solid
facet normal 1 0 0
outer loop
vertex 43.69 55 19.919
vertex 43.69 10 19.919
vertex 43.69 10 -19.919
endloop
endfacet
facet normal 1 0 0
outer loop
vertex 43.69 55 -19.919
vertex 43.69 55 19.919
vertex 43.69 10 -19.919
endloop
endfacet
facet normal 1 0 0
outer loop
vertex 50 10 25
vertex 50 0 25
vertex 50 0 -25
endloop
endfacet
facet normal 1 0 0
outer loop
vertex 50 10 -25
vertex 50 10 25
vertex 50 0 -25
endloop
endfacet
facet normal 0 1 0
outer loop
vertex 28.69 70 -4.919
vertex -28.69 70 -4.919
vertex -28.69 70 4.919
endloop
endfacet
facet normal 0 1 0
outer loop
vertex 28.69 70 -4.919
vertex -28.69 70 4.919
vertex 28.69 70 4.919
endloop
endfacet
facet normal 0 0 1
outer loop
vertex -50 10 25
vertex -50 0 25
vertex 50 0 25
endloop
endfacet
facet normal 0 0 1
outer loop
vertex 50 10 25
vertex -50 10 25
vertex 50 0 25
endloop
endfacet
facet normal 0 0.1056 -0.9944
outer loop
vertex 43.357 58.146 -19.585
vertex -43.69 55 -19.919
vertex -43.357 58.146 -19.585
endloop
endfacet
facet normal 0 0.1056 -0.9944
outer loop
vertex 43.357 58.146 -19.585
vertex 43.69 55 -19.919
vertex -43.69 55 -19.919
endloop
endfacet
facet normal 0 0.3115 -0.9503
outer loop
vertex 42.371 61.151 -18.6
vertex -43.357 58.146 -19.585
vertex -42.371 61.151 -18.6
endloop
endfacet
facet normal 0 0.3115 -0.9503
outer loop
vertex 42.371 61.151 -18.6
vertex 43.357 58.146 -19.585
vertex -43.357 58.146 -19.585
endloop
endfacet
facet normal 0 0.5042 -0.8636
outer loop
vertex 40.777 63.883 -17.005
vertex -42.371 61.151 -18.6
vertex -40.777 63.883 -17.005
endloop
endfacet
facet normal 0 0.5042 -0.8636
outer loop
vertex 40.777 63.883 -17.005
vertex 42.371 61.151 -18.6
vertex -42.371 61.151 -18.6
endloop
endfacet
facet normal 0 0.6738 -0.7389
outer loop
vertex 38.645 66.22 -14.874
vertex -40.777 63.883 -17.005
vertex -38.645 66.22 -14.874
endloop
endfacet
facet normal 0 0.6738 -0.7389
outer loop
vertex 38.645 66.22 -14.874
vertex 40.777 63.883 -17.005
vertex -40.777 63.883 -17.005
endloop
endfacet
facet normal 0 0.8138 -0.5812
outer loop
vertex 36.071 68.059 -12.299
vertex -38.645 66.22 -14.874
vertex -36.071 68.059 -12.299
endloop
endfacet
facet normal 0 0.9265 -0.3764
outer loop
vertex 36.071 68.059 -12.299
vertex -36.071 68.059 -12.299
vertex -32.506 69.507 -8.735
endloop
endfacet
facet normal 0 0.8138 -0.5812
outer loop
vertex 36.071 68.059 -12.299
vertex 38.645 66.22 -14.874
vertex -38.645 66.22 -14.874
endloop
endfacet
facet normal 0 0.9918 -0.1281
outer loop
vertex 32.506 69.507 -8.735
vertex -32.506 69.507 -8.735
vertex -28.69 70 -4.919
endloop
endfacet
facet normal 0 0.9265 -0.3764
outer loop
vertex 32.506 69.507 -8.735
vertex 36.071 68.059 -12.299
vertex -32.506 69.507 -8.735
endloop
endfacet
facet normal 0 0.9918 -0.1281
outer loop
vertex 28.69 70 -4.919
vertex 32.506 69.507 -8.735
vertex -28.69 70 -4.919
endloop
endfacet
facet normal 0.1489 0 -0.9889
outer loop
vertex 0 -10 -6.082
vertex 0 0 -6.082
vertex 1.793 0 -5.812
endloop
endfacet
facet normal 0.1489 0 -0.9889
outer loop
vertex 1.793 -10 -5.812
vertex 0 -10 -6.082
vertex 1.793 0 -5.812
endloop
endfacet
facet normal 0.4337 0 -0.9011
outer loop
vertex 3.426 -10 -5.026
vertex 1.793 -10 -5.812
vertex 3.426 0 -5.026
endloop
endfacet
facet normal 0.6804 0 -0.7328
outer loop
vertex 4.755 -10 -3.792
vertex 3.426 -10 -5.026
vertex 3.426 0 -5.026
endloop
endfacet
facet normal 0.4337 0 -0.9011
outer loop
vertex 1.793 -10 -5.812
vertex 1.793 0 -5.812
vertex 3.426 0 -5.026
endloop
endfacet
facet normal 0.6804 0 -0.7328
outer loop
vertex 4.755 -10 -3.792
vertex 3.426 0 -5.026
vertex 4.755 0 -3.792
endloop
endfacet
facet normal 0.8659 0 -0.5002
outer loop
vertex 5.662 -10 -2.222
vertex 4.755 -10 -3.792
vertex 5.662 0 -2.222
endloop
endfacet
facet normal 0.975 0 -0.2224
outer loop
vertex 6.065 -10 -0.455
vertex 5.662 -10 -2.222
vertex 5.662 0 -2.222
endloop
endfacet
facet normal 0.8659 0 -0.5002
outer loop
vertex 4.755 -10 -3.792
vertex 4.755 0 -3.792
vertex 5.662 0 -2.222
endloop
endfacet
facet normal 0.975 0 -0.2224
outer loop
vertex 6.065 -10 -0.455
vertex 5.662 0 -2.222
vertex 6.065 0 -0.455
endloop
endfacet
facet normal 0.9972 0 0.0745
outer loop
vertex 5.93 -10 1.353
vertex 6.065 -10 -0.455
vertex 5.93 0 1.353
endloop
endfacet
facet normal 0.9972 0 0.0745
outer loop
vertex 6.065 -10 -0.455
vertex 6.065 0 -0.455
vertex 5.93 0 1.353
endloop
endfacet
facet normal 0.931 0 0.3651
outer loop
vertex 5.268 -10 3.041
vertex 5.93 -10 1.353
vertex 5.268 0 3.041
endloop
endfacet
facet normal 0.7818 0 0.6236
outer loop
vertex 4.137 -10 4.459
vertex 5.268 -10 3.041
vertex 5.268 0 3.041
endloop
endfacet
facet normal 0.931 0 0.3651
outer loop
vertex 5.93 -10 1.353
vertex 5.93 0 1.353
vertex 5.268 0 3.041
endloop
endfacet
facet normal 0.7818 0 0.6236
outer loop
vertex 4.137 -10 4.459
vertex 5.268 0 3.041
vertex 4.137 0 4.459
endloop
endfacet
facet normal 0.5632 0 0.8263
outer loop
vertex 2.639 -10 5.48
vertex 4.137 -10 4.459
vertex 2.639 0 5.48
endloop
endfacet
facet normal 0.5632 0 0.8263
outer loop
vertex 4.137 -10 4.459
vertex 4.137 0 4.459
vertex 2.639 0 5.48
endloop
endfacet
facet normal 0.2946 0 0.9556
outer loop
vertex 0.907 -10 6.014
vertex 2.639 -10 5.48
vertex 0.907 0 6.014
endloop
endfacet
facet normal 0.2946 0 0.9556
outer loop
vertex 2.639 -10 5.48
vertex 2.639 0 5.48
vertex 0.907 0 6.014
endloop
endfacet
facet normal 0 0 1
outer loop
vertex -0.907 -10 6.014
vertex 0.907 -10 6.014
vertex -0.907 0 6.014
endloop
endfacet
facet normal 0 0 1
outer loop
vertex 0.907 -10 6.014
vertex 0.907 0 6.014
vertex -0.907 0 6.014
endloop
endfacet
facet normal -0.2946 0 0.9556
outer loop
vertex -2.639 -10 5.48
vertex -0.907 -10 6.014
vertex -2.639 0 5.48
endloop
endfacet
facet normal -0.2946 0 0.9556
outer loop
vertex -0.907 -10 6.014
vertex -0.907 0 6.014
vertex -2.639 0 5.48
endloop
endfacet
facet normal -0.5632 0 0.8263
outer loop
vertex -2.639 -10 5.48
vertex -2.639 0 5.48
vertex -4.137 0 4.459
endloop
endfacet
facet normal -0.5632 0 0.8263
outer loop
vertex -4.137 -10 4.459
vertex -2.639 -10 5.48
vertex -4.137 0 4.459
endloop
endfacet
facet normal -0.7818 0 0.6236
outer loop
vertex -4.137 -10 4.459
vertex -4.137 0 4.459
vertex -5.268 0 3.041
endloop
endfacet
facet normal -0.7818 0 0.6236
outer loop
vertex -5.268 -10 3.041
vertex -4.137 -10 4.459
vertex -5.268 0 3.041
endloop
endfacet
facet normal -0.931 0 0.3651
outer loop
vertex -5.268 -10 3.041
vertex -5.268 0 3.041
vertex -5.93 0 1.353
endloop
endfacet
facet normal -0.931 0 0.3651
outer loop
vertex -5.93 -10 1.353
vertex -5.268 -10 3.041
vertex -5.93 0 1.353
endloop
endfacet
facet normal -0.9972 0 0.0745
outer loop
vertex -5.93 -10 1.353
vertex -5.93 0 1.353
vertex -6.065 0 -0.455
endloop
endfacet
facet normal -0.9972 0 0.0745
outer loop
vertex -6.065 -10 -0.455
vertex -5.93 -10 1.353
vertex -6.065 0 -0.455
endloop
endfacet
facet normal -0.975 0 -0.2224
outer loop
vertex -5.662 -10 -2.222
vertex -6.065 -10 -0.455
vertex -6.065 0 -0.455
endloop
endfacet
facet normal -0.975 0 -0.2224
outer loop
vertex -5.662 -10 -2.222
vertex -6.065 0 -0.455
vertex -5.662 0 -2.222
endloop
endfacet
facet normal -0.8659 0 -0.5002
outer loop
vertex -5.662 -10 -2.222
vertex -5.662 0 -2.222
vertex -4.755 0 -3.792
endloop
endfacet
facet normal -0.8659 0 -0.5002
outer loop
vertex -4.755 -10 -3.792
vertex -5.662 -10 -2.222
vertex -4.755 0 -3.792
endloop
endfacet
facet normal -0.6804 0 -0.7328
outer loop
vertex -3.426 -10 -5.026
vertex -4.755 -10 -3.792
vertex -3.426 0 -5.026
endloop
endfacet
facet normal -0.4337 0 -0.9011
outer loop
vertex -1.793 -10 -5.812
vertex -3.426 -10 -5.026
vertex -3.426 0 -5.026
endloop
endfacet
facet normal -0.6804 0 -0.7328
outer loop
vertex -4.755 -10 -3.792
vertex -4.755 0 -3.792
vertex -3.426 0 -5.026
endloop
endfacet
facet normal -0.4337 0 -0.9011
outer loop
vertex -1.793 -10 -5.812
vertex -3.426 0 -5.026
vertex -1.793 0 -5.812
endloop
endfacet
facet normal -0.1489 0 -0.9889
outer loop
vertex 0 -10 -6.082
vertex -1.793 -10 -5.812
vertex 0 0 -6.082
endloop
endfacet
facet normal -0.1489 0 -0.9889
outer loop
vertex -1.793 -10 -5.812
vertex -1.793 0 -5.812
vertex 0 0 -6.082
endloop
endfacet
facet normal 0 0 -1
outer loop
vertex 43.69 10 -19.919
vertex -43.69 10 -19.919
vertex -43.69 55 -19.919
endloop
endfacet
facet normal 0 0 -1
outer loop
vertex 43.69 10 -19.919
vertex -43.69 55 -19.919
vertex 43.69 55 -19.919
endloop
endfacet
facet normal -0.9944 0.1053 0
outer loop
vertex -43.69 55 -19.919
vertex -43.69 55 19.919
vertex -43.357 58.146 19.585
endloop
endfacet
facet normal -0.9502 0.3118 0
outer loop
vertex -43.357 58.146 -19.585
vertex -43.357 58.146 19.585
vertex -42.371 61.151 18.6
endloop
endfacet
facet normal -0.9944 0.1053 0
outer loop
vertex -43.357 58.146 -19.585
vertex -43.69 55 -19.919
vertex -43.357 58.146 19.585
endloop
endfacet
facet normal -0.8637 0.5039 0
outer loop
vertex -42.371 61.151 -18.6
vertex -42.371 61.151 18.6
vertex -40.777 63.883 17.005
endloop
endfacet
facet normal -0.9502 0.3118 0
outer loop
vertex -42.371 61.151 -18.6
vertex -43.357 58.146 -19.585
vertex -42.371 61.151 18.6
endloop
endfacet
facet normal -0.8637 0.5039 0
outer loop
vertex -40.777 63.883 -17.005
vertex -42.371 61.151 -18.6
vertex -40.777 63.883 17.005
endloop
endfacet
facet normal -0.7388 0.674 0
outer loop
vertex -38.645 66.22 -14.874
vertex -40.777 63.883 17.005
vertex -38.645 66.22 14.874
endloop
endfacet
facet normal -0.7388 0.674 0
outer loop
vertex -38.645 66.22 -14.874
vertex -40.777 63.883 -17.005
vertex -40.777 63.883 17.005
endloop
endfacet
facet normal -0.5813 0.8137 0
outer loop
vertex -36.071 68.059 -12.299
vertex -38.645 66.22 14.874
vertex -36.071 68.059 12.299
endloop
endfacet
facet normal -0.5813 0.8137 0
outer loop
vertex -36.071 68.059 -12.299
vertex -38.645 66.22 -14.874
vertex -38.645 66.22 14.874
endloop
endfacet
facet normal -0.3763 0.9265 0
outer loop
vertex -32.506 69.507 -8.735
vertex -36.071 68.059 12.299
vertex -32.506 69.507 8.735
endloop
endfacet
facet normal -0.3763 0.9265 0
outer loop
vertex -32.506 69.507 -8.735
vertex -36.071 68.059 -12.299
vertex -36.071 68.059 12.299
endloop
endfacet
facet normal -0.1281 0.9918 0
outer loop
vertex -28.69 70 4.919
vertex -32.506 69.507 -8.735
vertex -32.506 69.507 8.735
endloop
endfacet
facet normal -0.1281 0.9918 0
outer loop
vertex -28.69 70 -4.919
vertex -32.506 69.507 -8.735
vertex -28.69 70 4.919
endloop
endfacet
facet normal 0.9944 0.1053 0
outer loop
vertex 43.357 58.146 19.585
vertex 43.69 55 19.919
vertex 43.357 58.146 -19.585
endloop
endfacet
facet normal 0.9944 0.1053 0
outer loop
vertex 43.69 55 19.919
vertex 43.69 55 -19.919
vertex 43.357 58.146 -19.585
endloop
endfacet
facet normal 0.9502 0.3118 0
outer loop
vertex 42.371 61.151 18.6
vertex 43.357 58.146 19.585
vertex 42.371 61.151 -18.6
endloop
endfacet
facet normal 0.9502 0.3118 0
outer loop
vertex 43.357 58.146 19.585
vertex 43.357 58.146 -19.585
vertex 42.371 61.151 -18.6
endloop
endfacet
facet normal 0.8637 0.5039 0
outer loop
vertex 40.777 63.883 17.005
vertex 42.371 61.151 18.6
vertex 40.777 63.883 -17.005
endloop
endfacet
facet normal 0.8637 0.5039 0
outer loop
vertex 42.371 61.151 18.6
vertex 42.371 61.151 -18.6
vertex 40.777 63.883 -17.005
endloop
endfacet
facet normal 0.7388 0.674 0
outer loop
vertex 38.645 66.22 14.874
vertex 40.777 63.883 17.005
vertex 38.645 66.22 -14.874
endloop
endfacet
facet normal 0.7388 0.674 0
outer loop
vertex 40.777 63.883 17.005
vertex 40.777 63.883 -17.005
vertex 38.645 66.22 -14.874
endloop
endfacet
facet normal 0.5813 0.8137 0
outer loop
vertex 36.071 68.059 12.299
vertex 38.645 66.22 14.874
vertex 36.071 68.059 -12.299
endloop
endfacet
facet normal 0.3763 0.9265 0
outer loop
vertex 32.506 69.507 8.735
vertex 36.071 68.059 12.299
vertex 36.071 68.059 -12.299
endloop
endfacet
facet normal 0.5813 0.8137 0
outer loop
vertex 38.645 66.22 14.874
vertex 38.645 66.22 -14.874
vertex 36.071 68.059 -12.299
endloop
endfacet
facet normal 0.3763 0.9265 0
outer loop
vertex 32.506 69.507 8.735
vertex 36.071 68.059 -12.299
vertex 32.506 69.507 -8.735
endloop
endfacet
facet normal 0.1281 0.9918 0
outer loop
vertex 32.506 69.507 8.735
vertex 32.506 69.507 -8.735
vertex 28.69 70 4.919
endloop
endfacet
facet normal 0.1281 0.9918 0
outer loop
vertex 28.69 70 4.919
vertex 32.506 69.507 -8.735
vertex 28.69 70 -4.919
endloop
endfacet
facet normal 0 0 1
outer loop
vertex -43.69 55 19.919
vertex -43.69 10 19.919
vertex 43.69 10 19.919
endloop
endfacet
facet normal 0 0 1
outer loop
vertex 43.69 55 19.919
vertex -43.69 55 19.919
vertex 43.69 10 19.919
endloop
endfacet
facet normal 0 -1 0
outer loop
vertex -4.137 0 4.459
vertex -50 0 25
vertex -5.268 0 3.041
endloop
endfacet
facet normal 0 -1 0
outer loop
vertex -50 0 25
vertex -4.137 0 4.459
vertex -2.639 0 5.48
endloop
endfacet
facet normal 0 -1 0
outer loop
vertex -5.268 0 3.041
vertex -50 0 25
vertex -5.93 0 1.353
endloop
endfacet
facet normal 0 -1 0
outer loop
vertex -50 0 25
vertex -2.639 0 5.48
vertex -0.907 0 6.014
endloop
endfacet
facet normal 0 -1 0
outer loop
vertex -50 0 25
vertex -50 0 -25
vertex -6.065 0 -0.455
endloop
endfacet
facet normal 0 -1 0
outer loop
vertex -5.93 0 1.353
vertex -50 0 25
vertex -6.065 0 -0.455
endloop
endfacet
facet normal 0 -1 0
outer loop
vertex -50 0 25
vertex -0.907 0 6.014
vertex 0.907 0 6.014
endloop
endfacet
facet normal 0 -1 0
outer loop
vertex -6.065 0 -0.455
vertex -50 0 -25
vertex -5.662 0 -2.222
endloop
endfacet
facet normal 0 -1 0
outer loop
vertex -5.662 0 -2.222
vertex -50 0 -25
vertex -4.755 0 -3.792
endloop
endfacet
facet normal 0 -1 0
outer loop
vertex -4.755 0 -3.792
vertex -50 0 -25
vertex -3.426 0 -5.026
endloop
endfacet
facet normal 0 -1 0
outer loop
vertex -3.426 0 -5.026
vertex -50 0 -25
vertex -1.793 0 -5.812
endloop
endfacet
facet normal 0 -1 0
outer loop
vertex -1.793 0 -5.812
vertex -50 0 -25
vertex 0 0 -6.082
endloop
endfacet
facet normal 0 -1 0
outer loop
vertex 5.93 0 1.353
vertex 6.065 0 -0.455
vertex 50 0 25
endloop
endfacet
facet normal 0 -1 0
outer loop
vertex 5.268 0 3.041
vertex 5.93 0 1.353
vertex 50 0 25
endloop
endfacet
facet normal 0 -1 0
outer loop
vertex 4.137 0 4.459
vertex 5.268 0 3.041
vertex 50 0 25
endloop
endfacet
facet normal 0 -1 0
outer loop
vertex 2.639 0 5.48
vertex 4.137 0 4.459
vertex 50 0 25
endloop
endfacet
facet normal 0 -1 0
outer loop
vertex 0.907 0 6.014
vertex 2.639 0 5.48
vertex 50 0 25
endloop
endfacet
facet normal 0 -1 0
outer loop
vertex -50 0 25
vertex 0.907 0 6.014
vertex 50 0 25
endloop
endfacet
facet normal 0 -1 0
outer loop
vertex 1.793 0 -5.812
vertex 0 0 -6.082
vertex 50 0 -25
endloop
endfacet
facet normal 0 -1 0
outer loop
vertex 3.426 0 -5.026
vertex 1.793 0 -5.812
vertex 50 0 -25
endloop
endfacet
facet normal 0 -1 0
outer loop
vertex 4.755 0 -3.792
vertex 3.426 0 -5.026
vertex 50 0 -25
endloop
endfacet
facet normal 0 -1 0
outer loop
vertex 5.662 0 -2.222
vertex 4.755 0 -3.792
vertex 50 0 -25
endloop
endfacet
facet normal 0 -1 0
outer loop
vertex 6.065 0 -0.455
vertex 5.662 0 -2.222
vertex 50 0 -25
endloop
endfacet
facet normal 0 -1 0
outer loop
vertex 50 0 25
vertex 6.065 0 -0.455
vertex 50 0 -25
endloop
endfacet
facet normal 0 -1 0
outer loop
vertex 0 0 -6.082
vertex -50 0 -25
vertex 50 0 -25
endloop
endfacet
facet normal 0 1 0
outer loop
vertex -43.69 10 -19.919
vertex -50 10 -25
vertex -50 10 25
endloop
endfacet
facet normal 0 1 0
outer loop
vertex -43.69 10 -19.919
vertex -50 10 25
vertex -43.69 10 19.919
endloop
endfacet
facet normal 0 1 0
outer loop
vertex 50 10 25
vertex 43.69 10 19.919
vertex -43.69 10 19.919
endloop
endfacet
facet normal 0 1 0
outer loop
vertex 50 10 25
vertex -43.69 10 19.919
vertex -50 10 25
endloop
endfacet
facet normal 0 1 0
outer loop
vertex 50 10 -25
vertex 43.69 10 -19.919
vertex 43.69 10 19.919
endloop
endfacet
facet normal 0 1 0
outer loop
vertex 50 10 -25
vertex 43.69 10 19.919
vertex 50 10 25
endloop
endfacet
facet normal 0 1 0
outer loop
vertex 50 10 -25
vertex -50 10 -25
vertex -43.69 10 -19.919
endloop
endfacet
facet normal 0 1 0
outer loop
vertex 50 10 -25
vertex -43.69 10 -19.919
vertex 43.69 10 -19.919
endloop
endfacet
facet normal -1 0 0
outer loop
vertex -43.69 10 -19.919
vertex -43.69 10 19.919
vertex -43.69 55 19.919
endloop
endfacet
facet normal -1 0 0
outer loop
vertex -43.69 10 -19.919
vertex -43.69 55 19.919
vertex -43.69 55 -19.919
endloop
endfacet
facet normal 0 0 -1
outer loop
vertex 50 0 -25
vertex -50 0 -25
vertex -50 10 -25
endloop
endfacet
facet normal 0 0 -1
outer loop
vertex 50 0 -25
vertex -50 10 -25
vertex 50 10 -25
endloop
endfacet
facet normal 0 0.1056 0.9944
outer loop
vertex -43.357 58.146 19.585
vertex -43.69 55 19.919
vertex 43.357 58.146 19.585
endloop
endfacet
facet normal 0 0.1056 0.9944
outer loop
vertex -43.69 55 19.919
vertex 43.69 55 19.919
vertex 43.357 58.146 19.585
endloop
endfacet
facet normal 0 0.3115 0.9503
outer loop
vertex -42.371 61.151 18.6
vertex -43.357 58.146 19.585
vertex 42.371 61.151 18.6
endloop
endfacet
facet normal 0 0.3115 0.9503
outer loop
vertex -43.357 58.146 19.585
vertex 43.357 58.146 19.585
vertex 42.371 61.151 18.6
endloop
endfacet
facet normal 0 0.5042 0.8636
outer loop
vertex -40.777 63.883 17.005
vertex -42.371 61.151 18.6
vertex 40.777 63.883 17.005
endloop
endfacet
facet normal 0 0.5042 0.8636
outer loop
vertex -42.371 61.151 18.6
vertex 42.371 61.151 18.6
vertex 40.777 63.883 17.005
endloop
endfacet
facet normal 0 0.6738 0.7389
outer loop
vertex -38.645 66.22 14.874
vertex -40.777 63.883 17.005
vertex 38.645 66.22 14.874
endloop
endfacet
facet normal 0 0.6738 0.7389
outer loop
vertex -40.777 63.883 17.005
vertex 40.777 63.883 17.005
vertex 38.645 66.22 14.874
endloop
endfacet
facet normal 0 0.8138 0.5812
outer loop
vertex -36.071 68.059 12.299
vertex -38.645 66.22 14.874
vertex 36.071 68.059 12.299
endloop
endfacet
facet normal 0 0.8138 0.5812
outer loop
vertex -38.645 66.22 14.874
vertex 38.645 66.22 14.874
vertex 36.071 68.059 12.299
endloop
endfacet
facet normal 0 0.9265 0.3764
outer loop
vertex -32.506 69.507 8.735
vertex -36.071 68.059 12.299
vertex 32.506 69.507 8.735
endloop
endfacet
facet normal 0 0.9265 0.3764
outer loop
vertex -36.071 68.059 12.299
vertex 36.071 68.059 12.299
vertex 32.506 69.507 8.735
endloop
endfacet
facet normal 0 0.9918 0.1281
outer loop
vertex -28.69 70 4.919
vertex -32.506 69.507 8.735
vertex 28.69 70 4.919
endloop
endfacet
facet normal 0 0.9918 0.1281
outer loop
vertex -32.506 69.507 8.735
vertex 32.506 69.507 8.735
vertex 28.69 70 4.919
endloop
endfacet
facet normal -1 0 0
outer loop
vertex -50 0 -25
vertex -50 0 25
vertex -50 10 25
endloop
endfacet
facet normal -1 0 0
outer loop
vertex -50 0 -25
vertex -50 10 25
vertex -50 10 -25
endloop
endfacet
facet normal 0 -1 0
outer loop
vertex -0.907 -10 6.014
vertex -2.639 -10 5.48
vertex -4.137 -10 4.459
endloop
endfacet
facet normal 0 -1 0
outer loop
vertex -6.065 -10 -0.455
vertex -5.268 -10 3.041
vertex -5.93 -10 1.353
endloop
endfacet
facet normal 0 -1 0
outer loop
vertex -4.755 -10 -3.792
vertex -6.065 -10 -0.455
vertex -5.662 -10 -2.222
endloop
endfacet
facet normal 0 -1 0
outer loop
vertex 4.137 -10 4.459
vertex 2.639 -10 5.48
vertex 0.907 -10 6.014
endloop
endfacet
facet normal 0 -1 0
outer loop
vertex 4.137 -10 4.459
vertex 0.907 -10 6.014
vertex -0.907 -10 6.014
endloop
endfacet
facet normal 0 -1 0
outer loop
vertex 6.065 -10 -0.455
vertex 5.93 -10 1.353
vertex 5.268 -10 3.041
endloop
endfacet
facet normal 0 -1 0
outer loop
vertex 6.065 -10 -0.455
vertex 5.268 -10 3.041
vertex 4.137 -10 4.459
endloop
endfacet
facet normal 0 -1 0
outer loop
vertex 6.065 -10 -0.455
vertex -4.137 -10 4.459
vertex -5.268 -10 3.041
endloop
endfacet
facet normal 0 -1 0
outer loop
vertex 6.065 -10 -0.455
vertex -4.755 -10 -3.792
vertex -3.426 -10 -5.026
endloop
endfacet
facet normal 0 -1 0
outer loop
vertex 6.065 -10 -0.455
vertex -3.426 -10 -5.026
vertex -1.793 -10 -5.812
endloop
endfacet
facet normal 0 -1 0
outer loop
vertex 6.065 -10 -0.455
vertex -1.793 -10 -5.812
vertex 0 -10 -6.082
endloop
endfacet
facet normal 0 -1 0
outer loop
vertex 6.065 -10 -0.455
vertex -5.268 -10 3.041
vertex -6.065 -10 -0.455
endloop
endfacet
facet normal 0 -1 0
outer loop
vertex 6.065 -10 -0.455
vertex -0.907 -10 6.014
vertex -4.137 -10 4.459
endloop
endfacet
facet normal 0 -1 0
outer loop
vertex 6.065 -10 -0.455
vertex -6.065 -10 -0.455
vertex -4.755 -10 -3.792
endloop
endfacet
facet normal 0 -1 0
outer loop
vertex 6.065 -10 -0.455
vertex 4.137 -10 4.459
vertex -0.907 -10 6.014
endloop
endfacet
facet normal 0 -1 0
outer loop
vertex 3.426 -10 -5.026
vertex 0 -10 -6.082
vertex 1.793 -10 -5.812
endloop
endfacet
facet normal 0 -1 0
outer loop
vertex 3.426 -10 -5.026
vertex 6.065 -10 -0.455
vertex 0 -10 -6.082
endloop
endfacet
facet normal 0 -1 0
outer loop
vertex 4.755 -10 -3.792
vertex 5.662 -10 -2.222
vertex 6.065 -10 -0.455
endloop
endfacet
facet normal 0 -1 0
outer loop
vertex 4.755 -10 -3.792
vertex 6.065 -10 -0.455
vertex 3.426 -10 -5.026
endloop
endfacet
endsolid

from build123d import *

# Parameters (mm, degrees)
CROQUIS1_W              = 100
CROQUIS1_H              = 50
SALIENTE_EXTRUIR1_DEPTH = 10
CROQUIS2_W              = 87.380374462
CROQUIS2_H              = 39.837581604
SALIENTE_EXTRUIR2_DEPTH = 60
REDONDEO1_R             = 15
CROQUIS3_R              = 6.082397519
SALIENTE_EXTRUIR3_DEPTH = 10


with BuildPart() as part:
    # Croquis1 → Saliente-Extruir1 (new body)
    with BuildSketch(Plane(origin=(0, 0, 0), x_dir=(1, 0, 0), z_dir=(0, 1, 0))):
        Rectangle(CROQUIS1_W, CROQUIS1_H)
    extrude(amount=SALIENTE_EXTRUIR1_DEPTH)

    # Croquis2 → Saliente-Extruir2 (add)
    with BuildSketch(Plane(origin=(0, 10, 0), x_dir=(1, 0, 0), z_dir=(0, 1, 0))):
        Rectangle(CROQUIS2_W, CROQUIS2_H)
    extrude(amount=SALIENTE_EXTRUIR2_DEPTH)

    # Redondeo1
    redondeo1_edges = [part.edges().sort_by_distance(p)[0] for p in [
        (-43.690187231, 70, 0),
        (0, 70, 19.918790802),
        (43.690187231, 70, 0),
        (0, 70, -19.918790802),
    ]]
    fillet(redondeo1_edges, radius=REDONDEO1_R)

    # Croquis3 → Saliente-Extruir3 (add)
    with BuildSketch(Plane.XZ):
        with Locations(Location((0, 0, 0), (0, 0, 270))):
            Circle(CROQUIS3_R)
    extrude(amount=SALIENTE_EXTRUIR3_DEPTH)


solid = part.part
